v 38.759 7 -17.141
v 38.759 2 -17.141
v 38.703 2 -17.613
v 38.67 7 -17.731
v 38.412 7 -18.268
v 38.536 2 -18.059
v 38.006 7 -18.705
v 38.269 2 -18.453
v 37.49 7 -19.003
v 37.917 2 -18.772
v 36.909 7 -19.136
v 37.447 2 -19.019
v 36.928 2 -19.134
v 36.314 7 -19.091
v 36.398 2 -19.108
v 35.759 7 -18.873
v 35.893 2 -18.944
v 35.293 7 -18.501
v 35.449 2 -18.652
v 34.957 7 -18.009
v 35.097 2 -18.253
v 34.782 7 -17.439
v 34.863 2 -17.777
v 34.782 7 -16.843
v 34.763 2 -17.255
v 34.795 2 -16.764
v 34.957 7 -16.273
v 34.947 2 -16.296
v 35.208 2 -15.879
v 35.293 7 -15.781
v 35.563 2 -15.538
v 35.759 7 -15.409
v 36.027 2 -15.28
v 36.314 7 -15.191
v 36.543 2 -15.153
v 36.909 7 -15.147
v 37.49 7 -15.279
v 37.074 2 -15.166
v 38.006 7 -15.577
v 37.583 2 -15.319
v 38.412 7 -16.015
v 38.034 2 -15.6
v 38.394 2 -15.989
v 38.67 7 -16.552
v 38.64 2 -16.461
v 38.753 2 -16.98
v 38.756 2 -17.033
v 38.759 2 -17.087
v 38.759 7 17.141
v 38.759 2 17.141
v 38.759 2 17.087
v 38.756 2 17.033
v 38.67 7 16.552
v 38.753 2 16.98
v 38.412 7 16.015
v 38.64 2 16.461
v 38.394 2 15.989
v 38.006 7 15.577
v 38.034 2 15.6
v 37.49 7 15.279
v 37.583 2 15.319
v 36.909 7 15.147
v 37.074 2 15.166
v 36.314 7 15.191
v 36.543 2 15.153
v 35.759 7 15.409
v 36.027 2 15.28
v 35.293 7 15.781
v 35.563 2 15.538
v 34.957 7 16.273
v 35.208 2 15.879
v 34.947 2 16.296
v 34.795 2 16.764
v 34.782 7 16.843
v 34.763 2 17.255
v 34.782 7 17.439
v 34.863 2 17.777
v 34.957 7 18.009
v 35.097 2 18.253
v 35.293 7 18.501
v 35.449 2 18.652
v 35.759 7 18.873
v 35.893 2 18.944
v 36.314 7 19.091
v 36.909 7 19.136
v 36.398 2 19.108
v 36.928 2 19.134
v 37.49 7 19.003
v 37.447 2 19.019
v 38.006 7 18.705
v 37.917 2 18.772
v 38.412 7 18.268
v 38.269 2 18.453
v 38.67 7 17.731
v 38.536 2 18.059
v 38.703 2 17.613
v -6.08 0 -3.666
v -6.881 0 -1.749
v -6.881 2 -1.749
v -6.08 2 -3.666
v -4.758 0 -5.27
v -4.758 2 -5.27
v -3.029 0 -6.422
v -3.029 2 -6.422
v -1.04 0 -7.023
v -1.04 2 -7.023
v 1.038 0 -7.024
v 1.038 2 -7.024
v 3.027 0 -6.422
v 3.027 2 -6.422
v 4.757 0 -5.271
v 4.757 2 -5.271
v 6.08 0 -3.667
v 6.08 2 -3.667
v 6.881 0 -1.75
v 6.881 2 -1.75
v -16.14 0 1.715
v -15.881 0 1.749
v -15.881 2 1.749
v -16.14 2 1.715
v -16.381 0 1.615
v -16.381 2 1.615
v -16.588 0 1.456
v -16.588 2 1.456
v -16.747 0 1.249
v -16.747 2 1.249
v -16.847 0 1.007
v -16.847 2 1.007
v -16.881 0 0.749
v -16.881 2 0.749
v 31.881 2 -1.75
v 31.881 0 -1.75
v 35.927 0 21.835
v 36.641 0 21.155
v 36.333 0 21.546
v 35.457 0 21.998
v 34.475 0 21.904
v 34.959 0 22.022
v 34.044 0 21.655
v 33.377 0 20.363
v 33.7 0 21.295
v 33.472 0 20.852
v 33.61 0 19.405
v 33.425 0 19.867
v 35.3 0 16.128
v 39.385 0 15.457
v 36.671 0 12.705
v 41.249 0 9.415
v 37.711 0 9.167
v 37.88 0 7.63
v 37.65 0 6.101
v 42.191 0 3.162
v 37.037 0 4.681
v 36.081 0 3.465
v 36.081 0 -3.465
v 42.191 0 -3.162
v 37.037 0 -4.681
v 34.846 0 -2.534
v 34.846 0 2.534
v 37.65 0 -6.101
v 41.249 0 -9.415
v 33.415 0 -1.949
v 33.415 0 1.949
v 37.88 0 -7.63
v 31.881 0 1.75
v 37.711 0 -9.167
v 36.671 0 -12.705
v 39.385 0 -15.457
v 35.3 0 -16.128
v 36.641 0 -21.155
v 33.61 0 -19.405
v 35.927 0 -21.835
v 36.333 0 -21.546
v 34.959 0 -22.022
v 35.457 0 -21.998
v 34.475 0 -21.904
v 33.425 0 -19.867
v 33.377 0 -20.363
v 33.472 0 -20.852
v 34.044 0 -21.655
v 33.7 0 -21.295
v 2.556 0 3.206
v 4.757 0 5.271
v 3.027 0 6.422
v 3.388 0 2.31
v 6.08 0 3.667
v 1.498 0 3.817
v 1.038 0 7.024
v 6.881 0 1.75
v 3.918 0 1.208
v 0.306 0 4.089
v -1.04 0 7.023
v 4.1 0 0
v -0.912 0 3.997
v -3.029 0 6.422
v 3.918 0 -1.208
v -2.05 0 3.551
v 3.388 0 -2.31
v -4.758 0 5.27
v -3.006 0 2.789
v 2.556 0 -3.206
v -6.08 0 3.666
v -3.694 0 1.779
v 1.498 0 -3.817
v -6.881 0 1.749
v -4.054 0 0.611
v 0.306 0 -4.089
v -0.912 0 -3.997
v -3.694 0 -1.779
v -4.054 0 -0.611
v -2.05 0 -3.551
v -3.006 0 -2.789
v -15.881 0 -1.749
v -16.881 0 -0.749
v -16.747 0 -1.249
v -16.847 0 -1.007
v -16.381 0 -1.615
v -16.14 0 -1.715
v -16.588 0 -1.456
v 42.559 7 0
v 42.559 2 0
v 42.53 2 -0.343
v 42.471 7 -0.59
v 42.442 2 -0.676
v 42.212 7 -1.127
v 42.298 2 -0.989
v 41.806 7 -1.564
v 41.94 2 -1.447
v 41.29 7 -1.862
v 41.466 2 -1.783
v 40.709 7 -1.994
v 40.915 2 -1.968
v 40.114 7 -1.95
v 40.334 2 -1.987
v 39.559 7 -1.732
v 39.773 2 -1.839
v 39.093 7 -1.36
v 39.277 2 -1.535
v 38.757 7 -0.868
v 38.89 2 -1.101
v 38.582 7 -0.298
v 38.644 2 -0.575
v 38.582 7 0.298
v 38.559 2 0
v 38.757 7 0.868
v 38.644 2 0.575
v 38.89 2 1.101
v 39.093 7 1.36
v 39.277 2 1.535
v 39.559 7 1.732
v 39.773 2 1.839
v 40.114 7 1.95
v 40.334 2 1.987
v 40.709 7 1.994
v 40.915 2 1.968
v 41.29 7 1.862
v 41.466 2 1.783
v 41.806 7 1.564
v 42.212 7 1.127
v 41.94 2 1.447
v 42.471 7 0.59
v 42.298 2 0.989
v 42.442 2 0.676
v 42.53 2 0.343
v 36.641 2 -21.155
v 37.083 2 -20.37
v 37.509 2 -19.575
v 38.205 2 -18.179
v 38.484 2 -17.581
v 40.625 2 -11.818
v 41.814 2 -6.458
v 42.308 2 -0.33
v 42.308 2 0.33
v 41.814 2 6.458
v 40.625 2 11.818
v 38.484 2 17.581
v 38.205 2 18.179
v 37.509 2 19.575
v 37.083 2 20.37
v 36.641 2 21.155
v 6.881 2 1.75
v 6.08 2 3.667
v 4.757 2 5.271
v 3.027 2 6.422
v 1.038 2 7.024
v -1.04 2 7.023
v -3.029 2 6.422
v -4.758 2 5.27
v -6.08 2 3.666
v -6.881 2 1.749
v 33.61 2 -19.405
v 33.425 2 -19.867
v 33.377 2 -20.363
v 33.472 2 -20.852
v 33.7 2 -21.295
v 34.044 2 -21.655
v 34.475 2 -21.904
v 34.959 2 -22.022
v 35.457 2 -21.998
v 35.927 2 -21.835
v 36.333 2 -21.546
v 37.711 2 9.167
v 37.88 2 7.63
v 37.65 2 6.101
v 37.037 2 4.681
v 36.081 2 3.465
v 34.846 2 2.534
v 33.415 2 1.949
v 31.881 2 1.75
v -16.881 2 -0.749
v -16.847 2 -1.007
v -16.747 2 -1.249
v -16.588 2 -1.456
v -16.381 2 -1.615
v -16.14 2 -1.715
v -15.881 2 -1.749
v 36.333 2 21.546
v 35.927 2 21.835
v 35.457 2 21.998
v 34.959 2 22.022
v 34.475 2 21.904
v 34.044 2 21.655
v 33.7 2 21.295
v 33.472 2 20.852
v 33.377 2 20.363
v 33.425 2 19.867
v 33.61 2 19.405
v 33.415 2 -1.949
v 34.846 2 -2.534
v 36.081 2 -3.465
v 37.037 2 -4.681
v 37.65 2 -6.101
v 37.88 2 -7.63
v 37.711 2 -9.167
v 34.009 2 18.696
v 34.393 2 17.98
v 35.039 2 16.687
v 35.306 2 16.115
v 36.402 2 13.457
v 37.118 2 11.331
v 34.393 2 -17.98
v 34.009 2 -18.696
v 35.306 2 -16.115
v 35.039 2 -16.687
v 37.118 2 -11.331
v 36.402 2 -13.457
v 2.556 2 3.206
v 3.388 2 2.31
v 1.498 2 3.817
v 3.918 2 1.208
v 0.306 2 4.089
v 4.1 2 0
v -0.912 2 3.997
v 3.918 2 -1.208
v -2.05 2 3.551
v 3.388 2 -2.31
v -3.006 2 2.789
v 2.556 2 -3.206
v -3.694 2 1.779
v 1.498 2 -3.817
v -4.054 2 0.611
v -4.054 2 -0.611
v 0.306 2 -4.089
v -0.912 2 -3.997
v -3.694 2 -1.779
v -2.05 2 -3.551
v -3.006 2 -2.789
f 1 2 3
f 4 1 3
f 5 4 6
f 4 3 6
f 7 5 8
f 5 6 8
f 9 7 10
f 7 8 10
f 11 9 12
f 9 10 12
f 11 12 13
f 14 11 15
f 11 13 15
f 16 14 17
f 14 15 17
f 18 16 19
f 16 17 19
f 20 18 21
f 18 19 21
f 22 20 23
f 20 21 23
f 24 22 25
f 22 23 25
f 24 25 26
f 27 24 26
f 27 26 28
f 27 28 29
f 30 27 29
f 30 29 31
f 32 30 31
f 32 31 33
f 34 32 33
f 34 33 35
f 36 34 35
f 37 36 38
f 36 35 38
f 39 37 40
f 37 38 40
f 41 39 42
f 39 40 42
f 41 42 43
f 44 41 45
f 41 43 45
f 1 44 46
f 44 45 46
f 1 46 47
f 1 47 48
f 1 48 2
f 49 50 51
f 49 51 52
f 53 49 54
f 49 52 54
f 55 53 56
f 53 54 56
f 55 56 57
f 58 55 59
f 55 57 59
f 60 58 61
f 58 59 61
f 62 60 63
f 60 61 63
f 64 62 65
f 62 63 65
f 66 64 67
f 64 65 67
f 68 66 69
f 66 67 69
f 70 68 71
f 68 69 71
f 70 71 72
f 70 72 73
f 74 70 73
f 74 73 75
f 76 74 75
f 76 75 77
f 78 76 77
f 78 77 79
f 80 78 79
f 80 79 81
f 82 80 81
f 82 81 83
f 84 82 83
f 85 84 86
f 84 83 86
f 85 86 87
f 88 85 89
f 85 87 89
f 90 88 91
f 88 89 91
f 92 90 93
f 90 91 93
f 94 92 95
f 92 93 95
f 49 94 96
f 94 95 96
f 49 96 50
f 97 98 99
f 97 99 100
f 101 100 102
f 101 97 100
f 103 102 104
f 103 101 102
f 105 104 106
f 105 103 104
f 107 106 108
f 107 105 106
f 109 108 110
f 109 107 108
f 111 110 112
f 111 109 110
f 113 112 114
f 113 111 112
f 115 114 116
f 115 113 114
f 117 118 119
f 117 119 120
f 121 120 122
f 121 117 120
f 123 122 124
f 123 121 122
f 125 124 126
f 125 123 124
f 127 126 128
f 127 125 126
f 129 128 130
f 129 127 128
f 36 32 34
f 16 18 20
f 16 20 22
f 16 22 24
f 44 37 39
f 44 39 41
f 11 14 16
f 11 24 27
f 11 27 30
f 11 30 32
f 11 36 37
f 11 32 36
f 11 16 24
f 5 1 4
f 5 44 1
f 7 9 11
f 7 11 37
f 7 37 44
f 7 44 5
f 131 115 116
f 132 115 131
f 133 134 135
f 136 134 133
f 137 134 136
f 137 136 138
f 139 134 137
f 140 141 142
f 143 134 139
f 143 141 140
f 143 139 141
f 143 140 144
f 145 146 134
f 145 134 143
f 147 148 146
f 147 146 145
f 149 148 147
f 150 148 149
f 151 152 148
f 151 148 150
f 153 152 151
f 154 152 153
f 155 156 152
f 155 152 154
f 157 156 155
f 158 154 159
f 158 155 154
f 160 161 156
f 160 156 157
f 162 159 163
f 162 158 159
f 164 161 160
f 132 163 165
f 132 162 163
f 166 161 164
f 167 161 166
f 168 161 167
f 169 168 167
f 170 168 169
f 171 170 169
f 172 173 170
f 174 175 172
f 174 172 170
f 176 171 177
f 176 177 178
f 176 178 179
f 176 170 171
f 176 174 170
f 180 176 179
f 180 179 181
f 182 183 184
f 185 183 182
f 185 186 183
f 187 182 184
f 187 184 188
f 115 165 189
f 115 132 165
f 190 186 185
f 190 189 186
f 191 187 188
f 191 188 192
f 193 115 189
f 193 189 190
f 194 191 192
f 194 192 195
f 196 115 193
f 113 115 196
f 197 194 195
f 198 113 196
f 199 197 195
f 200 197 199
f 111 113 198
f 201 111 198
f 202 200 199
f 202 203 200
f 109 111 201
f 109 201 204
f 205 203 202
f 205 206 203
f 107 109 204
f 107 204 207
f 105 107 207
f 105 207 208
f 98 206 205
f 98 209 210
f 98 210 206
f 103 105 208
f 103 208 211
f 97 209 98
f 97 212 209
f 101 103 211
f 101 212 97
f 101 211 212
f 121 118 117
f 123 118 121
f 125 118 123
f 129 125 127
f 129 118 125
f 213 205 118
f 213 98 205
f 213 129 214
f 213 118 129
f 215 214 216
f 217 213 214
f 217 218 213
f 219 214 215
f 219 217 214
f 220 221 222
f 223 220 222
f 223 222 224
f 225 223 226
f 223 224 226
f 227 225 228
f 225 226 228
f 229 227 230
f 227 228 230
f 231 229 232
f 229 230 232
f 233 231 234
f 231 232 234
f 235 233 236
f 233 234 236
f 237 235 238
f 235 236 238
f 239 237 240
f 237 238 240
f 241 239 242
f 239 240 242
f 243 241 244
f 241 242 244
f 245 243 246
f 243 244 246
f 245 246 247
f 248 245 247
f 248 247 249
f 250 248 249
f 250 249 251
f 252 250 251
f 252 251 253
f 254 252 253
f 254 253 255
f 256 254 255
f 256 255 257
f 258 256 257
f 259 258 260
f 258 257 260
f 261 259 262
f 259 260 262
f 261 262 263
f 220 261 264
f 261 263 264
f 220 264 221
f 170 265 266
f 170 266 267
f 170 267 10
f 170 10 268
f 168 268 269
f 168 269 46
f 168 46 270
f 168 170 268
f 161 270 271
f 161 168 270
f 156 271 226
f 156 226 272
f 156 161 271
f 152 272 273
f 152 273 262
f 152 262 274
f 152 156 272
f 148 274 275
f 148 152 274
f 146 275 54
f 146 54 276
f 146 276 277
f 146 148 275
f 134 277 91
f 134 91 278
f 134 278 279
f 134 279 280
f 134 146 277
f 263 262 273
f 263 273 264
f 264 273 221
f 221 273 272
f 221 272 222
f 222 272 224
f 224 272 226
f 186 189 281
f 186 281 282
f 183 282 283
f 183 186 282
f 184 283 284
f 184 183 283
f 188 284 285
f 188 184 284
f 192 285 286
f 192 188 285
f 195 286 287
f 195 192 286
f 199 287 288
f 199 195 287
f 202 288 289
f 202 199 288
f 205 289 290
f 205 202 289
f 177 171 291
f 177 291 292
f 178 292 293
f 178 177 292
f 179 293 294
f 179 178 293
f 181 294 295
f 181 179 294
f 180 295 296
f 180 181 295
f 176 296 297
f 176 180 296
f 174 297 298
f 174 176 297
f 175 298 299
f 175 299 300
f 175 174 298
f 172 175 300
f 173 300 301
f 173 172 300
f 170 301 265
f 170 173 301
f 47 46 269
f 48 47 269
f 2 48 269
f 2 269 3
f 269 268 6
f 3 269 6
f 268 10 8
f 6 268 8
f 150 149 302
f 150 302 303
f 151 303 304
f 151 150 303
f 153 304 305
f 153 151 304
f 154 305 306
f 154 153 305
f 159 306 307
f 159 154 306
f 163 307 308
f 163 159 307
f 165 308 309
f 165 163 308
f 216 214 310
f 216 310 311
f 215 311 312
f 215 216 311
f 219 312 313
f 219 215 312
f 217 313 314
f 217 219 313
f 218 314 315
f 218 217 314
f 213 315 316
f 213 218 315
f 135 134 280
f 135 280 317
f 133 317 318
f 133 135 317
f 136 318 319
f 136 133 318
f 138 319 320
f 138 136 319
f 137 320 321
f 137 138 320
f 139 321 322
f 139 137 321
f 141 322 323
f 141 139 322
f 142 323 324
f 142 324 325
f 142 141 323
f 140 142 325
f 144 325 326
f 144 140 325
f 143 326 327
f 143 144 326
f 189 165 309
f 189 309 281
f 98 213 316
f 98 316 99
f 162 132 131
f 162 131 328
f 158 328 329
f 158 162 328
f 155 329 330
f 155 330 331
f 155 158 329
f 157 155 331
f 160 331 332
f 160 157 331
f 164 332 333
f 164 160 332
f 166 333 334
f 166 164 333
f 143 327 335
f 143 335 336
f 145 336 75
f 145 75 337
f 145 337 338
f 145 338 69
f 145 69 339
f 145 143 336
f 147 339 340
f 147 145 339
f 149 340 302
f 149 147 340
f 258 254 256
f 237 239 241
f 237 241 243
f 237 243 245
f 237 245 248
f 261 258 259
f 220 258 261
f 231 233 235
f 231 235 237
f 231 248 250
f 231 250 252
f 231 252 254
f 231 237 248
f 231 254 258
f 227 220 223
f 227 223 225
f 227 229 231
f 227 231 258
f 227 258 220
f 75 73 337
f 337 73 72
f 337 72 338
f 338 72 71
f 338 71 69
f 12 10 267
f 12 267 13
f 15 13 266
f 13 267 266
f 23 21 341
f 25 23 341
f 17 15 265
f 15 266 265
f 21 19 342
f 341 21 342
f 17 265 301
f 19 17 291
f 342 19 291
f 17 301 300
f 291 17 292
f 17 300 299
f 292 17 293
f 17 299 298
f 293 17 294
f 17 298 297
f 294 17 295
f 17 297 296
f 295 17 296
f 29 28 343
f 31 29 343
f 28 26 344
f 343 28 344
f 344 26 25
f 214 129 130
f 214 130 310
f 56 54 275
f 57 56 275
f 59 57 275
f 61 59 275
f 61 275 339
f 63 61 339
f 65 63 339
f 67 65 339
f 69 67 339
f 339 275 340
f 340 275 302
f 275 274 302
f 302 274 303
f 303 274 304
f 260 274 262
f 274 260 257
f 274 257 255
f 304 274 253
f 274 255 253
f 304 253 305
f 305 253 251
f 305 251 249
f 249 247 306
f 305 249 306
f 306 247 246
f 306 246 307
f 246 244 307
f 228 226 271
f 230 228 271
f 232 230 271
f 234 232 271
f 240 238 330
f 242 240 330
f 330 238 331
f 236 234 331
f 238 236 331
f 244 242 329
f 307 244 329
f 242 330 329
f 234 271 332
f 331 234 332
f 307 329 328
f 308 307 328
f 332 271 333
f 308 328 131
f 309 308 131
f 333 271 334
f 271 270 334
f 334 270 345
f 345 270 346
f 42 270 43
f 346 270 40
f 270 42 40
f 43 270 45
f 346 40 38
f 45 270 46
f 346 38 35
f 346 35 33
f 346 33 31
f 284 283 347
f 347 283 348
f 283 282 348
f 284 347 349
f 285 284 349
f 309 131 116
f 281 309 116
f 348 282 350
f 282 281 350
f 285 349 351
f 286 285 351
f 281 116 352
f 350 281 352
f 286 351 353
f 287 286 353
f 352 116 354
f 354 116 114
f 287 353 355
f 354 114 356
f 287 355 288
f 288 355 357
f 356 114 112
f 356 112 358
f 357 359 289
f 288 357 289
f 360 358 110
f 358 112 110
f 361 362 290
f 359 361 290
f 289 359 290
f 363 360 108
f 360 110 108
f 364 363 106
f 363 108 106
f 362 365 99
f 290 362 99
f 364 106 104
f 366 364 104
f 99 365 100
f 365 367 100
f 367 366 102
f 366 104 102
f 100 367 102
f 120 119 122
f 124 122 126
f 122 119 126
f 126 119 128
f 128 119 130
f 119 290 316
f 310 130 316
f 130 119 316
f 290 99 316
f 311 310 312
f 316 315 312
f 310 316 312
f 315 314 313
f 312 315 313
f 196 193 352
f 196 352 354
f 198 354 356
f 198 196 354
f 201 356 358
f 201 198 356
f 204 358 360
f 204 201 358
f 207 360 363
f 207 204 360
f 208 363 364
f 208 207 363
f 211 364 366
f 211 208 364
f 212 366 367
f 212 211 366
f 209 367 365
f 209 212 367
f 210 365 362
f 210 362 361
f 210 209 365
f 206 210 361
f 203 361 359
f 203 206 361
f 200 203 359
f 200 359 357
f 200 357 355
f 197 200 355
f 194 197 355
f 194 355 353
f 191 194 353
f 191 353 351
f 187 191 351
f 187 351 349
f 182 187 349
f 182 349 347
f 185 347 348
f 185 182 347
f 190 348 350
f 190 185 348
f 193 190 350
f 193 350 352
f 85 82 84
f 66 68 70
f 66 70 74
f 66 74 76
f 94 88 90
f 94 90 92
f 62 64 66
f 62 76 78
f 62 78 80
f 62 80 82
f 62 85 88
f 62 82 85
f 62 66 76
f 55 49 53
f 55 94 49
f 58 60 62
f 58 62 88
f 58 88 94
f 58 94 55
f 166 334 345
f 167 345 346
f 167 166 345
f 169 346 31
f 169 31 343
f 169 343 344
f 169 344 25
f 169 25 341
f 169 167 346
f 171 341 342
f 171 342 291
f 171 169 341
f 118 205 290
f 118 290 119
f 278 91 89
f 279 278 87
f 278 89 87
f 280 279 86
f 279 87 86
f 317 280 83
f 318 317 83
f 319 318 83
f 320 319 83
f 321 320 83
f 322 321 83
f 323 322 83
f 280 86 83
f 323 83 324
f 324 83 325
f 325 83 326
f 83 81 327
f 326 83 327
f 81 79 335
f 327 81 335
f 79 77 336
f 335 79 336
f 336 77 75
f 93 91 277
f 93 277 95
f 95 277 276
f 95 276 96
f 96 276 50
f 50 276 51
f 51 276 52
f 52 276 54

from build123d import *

# Parameters (mm, degrees)
SKETCH1_R           = 4.1
BOSS_EXTRUDE1_DEPTH = 2
SKETCH2_R           = 2
BOSS_EXTRUDE2_DEPTH = 5


with BuildPart() as part:
    # Sketch1 → Boss-Extrude1 (new body)
    with BuildSketch(Plane(origin=(0, 0, 0), x_dir=(1, 0, 0), z_dir=(0, 1, 0))):
        with BuildLine():
            Line((6.880964228, 1.749997239), (31.880964166, 1.749997239))
            ThreePointArc((31.880964166, 1.749997239), (36.598148239, 4.042144166), (37.711172654, 9.167272434))
            ThreePointArc((37.711172654, 9.167272434), (36.026057764, 14.43241452), (33.609947488, 19.40471223))
            ThreePointArc((33.609947488, 19.40471223), (34.250491945, 21.795256686), (36.641036401, 21.15471223))
            ThreePointArc((36.641036401, 21.15471223), (42.309424459, 0), (36.641036401, -21.15471223))
            ThreePointArc((36.641036401, -21.15471223), (34.250491945, -21.795256686), (33.609947488, -19.40471223))
            ThreePointArc((33.609947488, -19.40471223), (36.026056514, -14.432417639), (37.711171067, -9.167278965))
            ThreePointArc((37.711171067, -9.167278965), (36.598147218, -4.042150095), (31.880962823, -1.750002761))
            Line((31.880962823, -1.750002761), (6.880962823, -1.750002761))
            ThreePointArc((6.880962823, -1.750002761), (-0.000729594, -7.100011163), (-6.881322337, -1.748588554))
            Line((-6.881322337, -1.748588554), (-15.881322337, -1.748588554))
            ThreePointArc((-15.881322337, -1.748588554), (-16.588429118, -1.455695335), (-16.881322337, -0.748588554))
            Line((-16.881322337, -0.748588554), (-16.881322337, 0.748588554))
            ThreePointArc((-16.881322337, 0.748588554), (-16.588429118, 1.455695335), (-15.881322337, 1.748588554))
            Line((-15.881322337, 1.748588554), (-6.881322337, 1.748588554))
            ThreePointArc((-6.881322337, 1.748588554), (-0.000726746, 7.100011163), (6.880964228, 1.749997239))
        make_face()
        Circle(SKETCH1_R, mode=Mode.SUBTRACT)
    extrude(amount=BOSS_EXTRUDE1_DEPTH)

    # Sketch2 → Boss-Extrude2 (add)
    with BuildSketch(Plane(origin=(0, 2, 0), x_dir=(1, 0, 0), z_dir=(0, 1, 0))):
        with Locations((36.759322225, 17.141153462)):
            Circle(SKETCH2_R)
        with Locations((40.559424459, 0)):
            Circle(SKETCH2_R)
        with Locations((36.759322225, -17.141153462)):
            Circle(SKETCH2_R)
    extrude(amount=BOSS_EXTRUDE2_DEPTH)


solid = part.part
